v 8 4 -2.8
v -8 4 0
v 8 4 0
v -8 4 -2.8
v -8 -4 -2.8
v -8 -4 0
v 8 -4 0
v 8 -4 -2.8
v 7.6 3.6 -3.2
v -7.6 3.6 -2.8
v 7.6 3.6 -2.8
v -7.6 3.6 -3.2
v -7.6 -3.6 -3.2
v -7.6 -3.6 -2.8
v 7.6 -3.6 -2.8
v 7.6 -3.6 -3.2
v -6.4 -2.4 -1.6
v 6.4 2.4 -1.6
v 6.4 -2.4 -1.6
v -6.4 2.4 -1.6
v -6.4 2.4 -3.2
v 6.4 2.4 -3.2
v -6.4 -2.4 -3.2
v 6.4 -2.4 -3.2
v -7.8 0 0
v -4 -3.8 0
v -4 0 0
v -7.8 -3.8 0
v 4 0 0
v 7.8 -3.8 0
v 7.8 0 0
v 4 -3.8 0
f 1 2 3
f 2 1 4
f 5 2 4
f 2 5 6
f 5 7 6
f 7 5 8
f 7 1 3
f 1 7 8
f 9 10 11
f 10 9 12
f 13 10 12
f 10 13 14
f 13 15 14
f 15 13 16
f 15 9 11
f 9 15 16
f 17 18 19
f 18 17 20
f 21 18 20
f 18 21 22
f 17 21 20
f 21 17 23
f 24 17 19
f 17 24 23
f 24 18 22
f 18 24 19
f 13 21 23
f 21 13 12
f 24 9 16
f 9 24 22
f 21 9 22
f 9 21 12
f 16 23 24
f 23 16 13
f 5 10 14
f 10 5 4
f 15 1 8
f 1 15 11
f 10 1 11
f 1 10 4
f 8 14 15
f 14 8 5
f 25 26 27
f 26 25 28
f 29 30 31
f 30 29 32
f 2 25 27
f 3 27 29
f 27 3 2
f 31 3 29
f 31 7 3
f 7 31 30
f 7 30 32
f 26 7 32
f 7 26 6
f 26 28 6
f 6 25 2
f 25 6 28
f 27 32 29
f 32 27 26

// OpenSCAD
// file: ../p/4-4edge.scad
use <../lib.scad>
$fa=1; $fs=0.2;
function ldraw_lib__4_4edge(realsolid=false) = [
// 0 Circle 1.0
// 0 Name: 4-4edge.dat
// 0 Author: James Jessiman
// 0 !LDRAW_ORG Primitive UPDATE 2017-01
// 0 !LICENSE Licensed under CC BY 2.0 and CC BY 4.0 : see CAreadme.txt
// 
// 0 BFC CERTIFY CCW
  [0,"BFC","CERTIFY"],
  [0,"BFC","CCW"],
// 
// 0 !HISTORY 1998-12-15 [PTadmin] Official Update 1998-10
// 0 !HISTORY 2005-12-28 [PTadmin] Official Update 2005-01
// 0 !HISTORY 2007-06-24 [PTadmin] Header formatted for Contributor Agreement
// 0 !HISTORY 2008-07-01 [PTadmin] Official Update 2008-01
// 0 !HISTORY 2017-01-15 [Steffen] BFCed
// 0 !HISTORY 2017-12-30 [PTadmin] Official Update 2017-01
// 
// 
// 2 24 1 0 0 0.9239 0 0.3827
  [2,24,1,0,0,0.9239,0,0.3827],
// 2 24 0.9239 0 0.3827 0.7071 0 0.7071
  [2,24,0.9239,0,0.3827,0.7071,0,0.7071],
// 2 24 0.7071 0 0.7071 0.3827 0 0.9239
  [2,24,0.7071,0,0.7071,0.3827,0,0.9239],
// 2 24 0.3827 0 0.9239 0 0 1
  [2,24,0.3827,0,0.9239,0,0,1],
// 2 24 0 0 1 -0.3827 0 0.9239
  [2,24,0,0,1,-0.3827,0,0.9239],
// 2 24 -0.3827 0 0.9239 -0.7071 0 0.7071
  [2,24,-0.3827,0,0.9239,-0.7071,0,0.7071],
// 2 24 -0.7071 0 0.7071 -0.9239 0 0.3827
  [2,24,-0.7071,0,0.7071,-0.9239,0,0.3827],
// 2 24 -0.9239 0 0.3827 -1 0 -0
  [2,24,-0.9239,0,0.3827,-1,0,-0],
// 2 24 -1 0 -0 -0.9239 0 -0.3827
  [2,24,-1,0,-0,-0.9239,0,-0.3827],
// 2 24 -0.9239 0 -0.3827 -0.7071 0 -0.7071
  [2,24,-0.9239,0,-0.3827,-0.7071,0,-0.7071],
// 2 24 -0.7071 0 -0.7071 -0.3827 0 -0.9239
  [2,24,-0.7071,0,-0.7071,-0.3827,0,-0.9239],
// 2 24 -0.3827 0 -0.9239 0 0 -1
  [2,24,-0.3827,0,-0.9239,0,0,-1],
// 2 24 0 0 -1 0.3827 0 -0.9239
  [2,24,0,0,-1,0.3827,0,-0.9239],
// 2 24 0.3827 0 -0.9239 0.7071 0 -0.7071
  [2,24,0.3827,0,-0.9239,0.7071,0,-0.7071],
// 2 24 0.7071 0 -0.7071 0.9239 0 -0.3827
  [2,24,0.7071,0,-0.7071,0.9239,0,-0.3827],
// 2 24 0.9239 0 -0.3827 1 0 0
  [2,24,0.9239,0,-0.3827,1,0,0],
];
module ldraw_lib__4_4edge(step=0, col=false, unit=2/5, alt=false, line=0.2, solid=!$preview)
    makepoly(ldraw_lib__4_4edge(solid), step=step, col=col, unit=unit, alt=alt, line=line, solid=solid);
ldraw_lib__4_4edge(line=0.2);
// file: ../p/4-4disc.scad
use <../lib.scad>
$fa=1; $fs=0.2;
function ldraw_lib__4_4disc(realsolid=false) = [
// 0 Disc 1.0
// 0 Name: 4-4disc.dat
// 0 Author: James Jessiman
// 0 !LDRAW_ORG Primitive UPDATE 2002-02
// 0 !LICENSE Licensed under CC BY 2.0 and CC BY 4.0 : see CAreadme.txt
// 
// 0 BFC CERTIFY CCW
  [0,"BFC","CERTIFY"],
  [0,"BFC","CCW"],
// 
// 0 !HISTORY 1998-12-15 [PTadmin] Official Update 1998-10
// 0 !HISTORY 2002-03-23 [sbliss] Added BFC statement
// 0 !HISTORY 2002-04-25 [PTadmin] Official Update 2002-02
// 0 !HISTORY 2007-06-24 [PTadmin] Header formatted for Contributor Agreement
// 0 !HISTORY 2008-07-01 [PTadmin] Official Update 2008-01
// 
// 
// 3 16 0 0 0 1 0 0 0.9239 0 0.3827
  [3,16,0,0,0,1,0,0,0.9239,0,0.3827],
// 3 16 0 0 0 0.9239 0 0.3827 0.7071 0 0.7071
  [3,16,0,0,0,0.9239,0,0.3827,0.7071,0,0.7071],
// 3 16 0 0 0 0.7071 0 0.7071 0.3827 0 0.9239
  [3,16,0,0,0,0.7071,0,0.7071,0.3827,0,0.9239],
// 3 16 0 0 0 0.3827 0 0.9239 0 0 1
  [3,16,0,0,0,0.3827,0,0.9239,0,0,1],
// 3 16 0 0 0 0 0 1 -0.3827 0 0.9239
  [3,16,0,0,0,0,0,1,-0.3827,0,0.9239],
// 3 16 0 0 0 -0.3827 0 0.9239 -0.7071 0 0.7071
  [3,16,0,0,0,-0.3827,0,0.9239,-0.7071,0,0.7071],
// 3 16 0 0 0 -0.7071 0 0.7071 -0.9239 0 0.3827
  [3,16,0,0,0,-0.7071,0,0.7071,-0.9239,0,0.3827],
// 3 16 0 0 0 -0.9239 0 0.3827 -1 0 -0
  [3,16,0,0,0,-0.9239,0,0.3827,-1,0,-0],
// 3 16 0 0 0 -1 0 -0 -0.9239 0 -0.3827
  [3,16,0,0,0,-1,0,-0,-0.9239,0,-0.3827],
// 3 16 0 0 0 -0.9239 0 -0.3827 -0.7071 0 -0.7071
  [3,16,0,0,0,-0.9239,0,-0.3827,-0.7071,0,-0.7071],
// 3 16 0 0 0 -0.7071 0 -0.7071 -0.3827 0 -0.9239
  [3,16,0,0,0,-0.7071,0,-0.7071,-0.3827,0,-0.9239],
// 3 16 0 0 0 -0.3827 0 -0.9239 0 0 -1
  [3,16,0,0,0,-0.3827,0,-0.9239,0,0,-1],
// 3 16 0 0 0 0 0 -1 0.3827 0 -0.9239
  [3,16,0,0,0,0,0,-1,0.3827,0,-0.9239],
// 3 16 0 0 0 0.3827 0 -0.9239 0.7071 0 -0.7071
  [3,16,0,0,0,0.3827,0,-0.9239,0.7071,0,-0.7071],
// 3 16 0 0 0 0.7071 0 -0.7071 0.9239 0 -0.3827
  [3,16,0,0,0,0.7071,0,-0.7071,0.9239,0,-0.3827],
// 3 16 0 0 0 0.9239 0 -0.3827 1 0 0
  [3,16,0,0,0,0.9239,0,-0.3827,1,0,0],
// 0
];
module ldraw_lib__4_4disc(step=0, col=false, unit=2/5, alt=false, line=0.2, solid=!$preview)
    makepoly(ldraw_lib__4_4disc(solid), step=step, col=col, unit=unit, alt=alt, line=line, solid=solid);
ldraw_lib__4_4disc(line=0.2);
// file: ../p/4-4cyli.scad
use <../lib.scad>
$fa=1; $fs=0.2;
function ldraw_lib__4_4cyli(realsolid=false) = [
// 0 Cylinder 1.0
// 0 Name: 4-4cyli.dat
// 0 Author: James Jessiman
// 0 !LDRAW_ORG Primitive UPDATE 2005-01
// 0 !LICENSE Licensed under CC BY 2.0 and CC BY 4.0 : see CAreadme.txt
// 
// 0 BFC CERTIFY CCW
  [0,"BFC","CERTIFY"],
  [0,"BFC","CCW"],
// 
// 0 !HISTORY 1998-12-15 [PTadmin] Official Update 1998-10
// 0 !HISTORY 2002-03-23 [sbliss] Added BFC statement; merged headers from files in distributions LDraw 0.27 and Complete.
// 0 !HISTORY 2002-04-25 [PTadmin] Official Update 2002-02
// 0 !HISTORY 2004-12-14 [guyvivan] BFC CCW
// 0 !HISTORY 2005-12-28 [PTadmin] Official Update 2005-01
// 0 !HISTORY 2007-06-24 [PTadmin] Header formatted for Contributor Agreement
// 0 !HISTORY 2008-07-01 [PTadmin] Official Update 2008-01
// 
// 
// 4 16 1 1 0 0.9239 1 0.3827 0.9239 0 0.3827 1 0 0
  [4,16,1,1,0,0.9239,1,0.3827,0.9239,0,0.3827,1,0,0],
// 5 24 1 0 0 1 1 0 0.9239 0 0.3827 0.9239 0 -0.3827
  [5,24,1,0,0,1,1,0,0.9239,0,0.3827,0.9239,0,-0.3827],
// 4 16 0.9239 1 0.3827 0.7071 1 0.7071 0.7071 0 0.7071 0.9239 0 0.3827
  [4,16,0.9239,1,0.3827,0.7071,1,0.7071,0.7071,0,0.7071,0.9239,0,0.3827],
// 5 24 0.9239 0 0.3827 0.9239 1 0.3827 0.7071 0 0.7071 1 0 0
  [5,24,0.9239,0,0.3827,0.9239,1,0.3827,0.7071,0,0.7071,1,0,0],
// 4 16 0.7071 1 0.7071 0.3827 1 0.9239 0.3827 0 0.9239 0.7071 0 0.7071
  [4,16,0.7071,1,0.7071,0.3827,1,0.9239,0.3827,0,0.9239,0.7071,0,0.7071],
// 5 24 0.7071 0 0.7071 0.7071 1 0.7071 0.3827 0 0.9239 0.9239 0 0.3827
  [5,24,0.7071,0,0.7071,0.7071,1,0.7071,0.3827,0,0.9239,0.9239,0,0.3827],
// 4 16 0.3827 1 0.9239 0 1 1 0 0 1 0.3827 0 0.9239
  [4,16,0.3827,1,0.9239,0,1,1,0,0,1,0.3827,0,0.9239],
// 5 24 0.3827 0 0.9239 0.3827 1 0.9239 0 0 1 0.7071 0 0.7071
  [5,24,0.3827,0,0.9239,0.3827,1,0.9239,0,0,1,0.7071,0,0.7071],
// 4 16 0 1 1 -0.3827 1 0.9239 -0.3827 0 0.9239 0 0 1
  [4,16,0,1,1,-0.3827,1,0.9239,-0.3827,0,0.9239,0,0,1],
// 5 24 0 0 1 0 1 1 -0.3827 0 0.9239 0.3827 0 0.9239
  [5,24,0,0,1,0,1,1,-0.3827,0,0.9239,0.3827,0,0.9239],
// 4 16 -0.3827 1 0.9239 -0.7071 1 0.7071 -0.7071 0 0.7071 -0.3827 0 0.9239
  [4,16,-0.3827,1,0.9239,-0.7071,1,0.7071,-0.7071,0,0.7071,-0.3827,0,0.9239],
// 5 24 -0.3827 0 0.9239 -0.3827 1 0.9239 -0.7071 0 0.7071 0 0 1
  [5,24,-0.3827,0,0.9239,-0.3827,1,0.9239,-0.7071,0,0.7071,0,0,1],
// 4 16 -0.7071 1 0.7071 -0.9239 1 0.3827 -0.9239 0 0.3827 -0.7071 0 0.7071
  [4,16,-0.7071,1,0.7071,-0.9239,1,0.3827,-0.9239,0,0.3827,-0.7071,0,0.7071],
// 5 24 -0.7071 0 0.7071 -0.7071 1 0.7071 -0.9239 0 0.3827 -0.3827 0 0.9239
  [5,24,-0.7071,0,0.7071,-0.7071,1,0.7071,-0.9239,0,0.3827,-0.3827,0,0.9239],
// 4 16 -0.9239 1 0.3827 -1 1 0 -1 0 0 -0.9239 0 0.3827
  [4,16,-0.9239,1,0.3827,-1,1,0,-1,0,0,-0.9239,0,0.3827],
// 5 24 -0.9239 0 0.3827 -0.9239 1 0.3827 -1 0 0 -0.7071 0 0.7071
  [5,24,-0.9239,0,0.3827,-0.9239,1,0.3827,-1,0,0,-0.7071,0,0.7071],
// 4 16 -1 1 0 -0.9239 1 -0.3827 -0.9239 0 -0.3827 -1 0 0
  [4,16,-1,1,0,-0.9239,1,-0.3827,-0.9239,0,-0.3827,-1,0,0],
// 5 24 -1 0 0 -1 1 0 -0.9239 0 -0.3827 -0.9239 0 0.3827
  [5,24,-1,0,0,-1,1,0,-0.9239,0,-0.3827,-0.9239,0,0.3827],
// 4 16 -0.9239 1 -0.3827 -0.7071 1 -0.7071 -0.7071 0 -0.7071 -0.9239 0 -0.3827
  [4,16,-0.9239,1,-0.3827,-0.7071,1,-0.7071,-0.7071,0,-0.7071,-0.9239,0,-0.3827],
// 5 24 -0.9239 0 -0.3827 -0.9239 1 -0.3827 -0.7071 0 -0.7071 -1 0 0
  [5,24,-0.9239,0,-0.3827,-0.9239,1,-0.3827,-0.7071,0,-0.7071,-1,0,0],
// 4 16 -0.7071 1 -0.7071 -0.3827 1 -0.9239 -0.3827 0 -0.9239 -0.7071 0 -0.7071
  [4,16,-0.7071,1,-0.7071,-0.3827,1,-0.9239,-0.3827,0,-0.9239,-0.7071,0,-0.7071],
// 5 24 -0.7071 0 -0.7071 -0.7071 1 -0.7071 -0.3827 0 -0.9239 -0.9239 0 -0.3827
  [5,24,-0.7071,0,-0.7071,-0.7071,1,-0.7071,-0.3827,0,-0.9239,-0.9239,0,-0.3827],
// 4 16 -0.3827 1 -0.9239 0 1 -1 0 0 -1 -0.3827 0 -0.9239
  [4,16,-0.3827,1,-0.9239,0,1,-1,0,0,-1,-0.3827,0,-0.9239],
// 5 24 -0.3827 0 -0.9239 -0.3827 1 -0.9239 0 0 -1 -0.7071 0 -0.7071
  [5,24,-0.3827,0,-0.9239,-0.3827,1,-0.9239,0,0,-1,-0.7071,0,-0.7071],
// 4 16 0 1 -1 0.3827 1 -0.9239 0.3827 0 -0.9239 0 0 -1
  [4,16,0,1,-1,0.3827,1,-0.9239,0.3827,0,-0.9239,0,0,-1],
// 5 24 0 0 -1 0 1 -1 0.3827 0 -0.9239 -0.3827 0 -0.9239
  [5,24,0,0,-1,0,1,-1,0.3827,0,-0.9239,-0.3827,0,-0.9239],
// 4 16 0.3827 1 -0.9239 0.7071 1 -0.7071 0.7071 0 -0.7071 0.3827 0 -0.9239
  [4,16,0.3827,1,-0.9239,0.7071,1,-0.7071,0.7071,0,-0.7071,0.3827,0,-0.9239],
// 5 24 0.3827 0 -0.9239 0.3827 1 -0.9239 0.7071 0 -0.7071 0 0 -1
  [5,24,0.3827,0,-0.9239,0.3827,1,-0.9239,0.7071,0,-0.7071,0,0,-1],
// 4 16 0.7071 1 -0.7071 0.9239 1 -0.3827 0.9239 0 -0.3827 0.7071 0 -0.7071
  [4,16,0.7071,1,-0.7071,0.9239,1,-0.3827,0.9239,0,-0.3827,0.7071,0,-0.7071],
// 5 24 0.7071 0 -0.7071 0.7071 1 -0.7071 0.9239 0 -0.3827 0.3827 0 -0.9239
  [5,24,0.7071,0,-0.7071,0.7071,1,-0.7071,0.9239,0,-0.3827,0.3827,0,-0.9239],
// 4 16 0.9239 1 -0.3827 1 1 0 1 0 0 0.9239 0 -0.3827
  [4,16,0.9239,1,-0.3827,1,1,0,1,0,0,0.9239,0,-0.3827],
// 5 24 0.9239 0 -0.3827 0.9239 1 -0.3827 1 0 0 0.7071 0 -0.7071
  [5,24,0.9239,0,-0.3827,0.9239,1,-0.3827,1,0,0,0.7071,0,-0.7071],
// 0
];
module ldraw_lib__4_4cyli(step=0, col=false, unit=2/5, alt=false, line=0.2, solid=!$preview)
    makepoly(ldraw_lib__4_4cyli(solid), step=step, col=col, unit=unit, alt=alt, line=line, solid=solid);
ldraw_lib__4_4cyli(line=0.2);
// file: ../p/stud3.scad
use <../lib.scad>
use <4-4cyli.scad>
use <4-4disc.scad>
use <4-4edge.scad>
$fa=1; $fs=0.2;
function ldraw_lib__stud3(realsolid=false) = realsolid ? 
    [openscad(translate([0,0,-eps()], o=cylinder(4+eps(), r=4)),2)] : [
// 0 Stud Tube Solid
// 0 Name: stud3.dat
// 0 Author: James Jessiman
// 0 !LDRAW_ORG Primitive UPDATE 2012-01
// 0 !LICENSE Licensed under CC BY 2.0 and CC BY 4.0 : see CAreadme.txt
// 
// 0 BFC CERTIFY CCW
  [0,"BFC","CERTIFY"],
  [0,"BFC","CCW"],
// 
// 0 !HISTORY 2002-04-04 [sbliss] Modified for BFC compliance
// 0 !HISTORY 2002-04-25 [PTadmin] Official Update 2002-02
// 0 !HISTORY 2007-06-24 [PTadmin] Header formatted for Contributor Agreement
// 0 !HISTORY 2008-07-01 [PTadmin] Official Update 2008-01
// 0 !HISTORY 2012-02-16 [Philo] Changed to CCW
// 0 !HISTORY 2012-03-30 [PTadmin] Official Update 2012-01
// 
// 
// 1 16 0 -4 0 4 0 0 0 1 0 0 0 4 4-4edge.dat
  [1,16,0,-4,0,4,0,0,0,1,0,0,0,4, ldraw_lib__4_4edge(realsolid)],
// 1 16 0 0 0 4 0 0 0 1 0 0 0 4 4-4edge.dat
  [1,16,0,0,0,4,0,0,0,1,0,0,0,4, ldraw_lib__4_4edge(realsolid)],
// 1 16 0 -4 0 4 0 0 0 1 0 0 0 4 4-4disc.dat
  [1,16,0,-4,0,4,0,0,0,1,0,0,0,4, ldraw_lib__4_4disc(realsolid)],
// 1 16 0 -4 0 4 0 0 0 4 0 0 0 4 4-4cyli.dat
  [1,16,0,-4,0,4,0,0,0,4,0,0,0,4, ldraw_lib__4_4cyli(realsolid)],
];
module ldraw_lib__stud3(step=0, col=false, unit=2/5, alt=false, line=0.2, solid=!$preview)
    makepoly(ldraw_lib__stud3(solid), step=step, col=col, unit=unit, alt=alt, line=line, solid=solid);
ldraw_lib__stud3(line=0.2);
// file: ../p/stud.scad
use <../lib.scad>
use <4-4cyli.scad>
use <4-4disc.scad>
use <4-4edge.scad>
$fa=1; $fs=0.2;
function ldraw_lib__stud(realsolid=false) = realsolid ? 
    [openscad(translate([0,0,-eps()], o=cylinder(4+eps(), r=6)),2)] : [
// 0 Stud
// 0 Name: stud.dat
// 0 Author: James Jessiman
// 0 !LDRAW_ORG Primitive UPDATE 2012-01
// 0 !LICENSE Licensed under CC BY 2.0 and CC BY 4.0 : see CAreadme.txt
// 
// 0 BFC CERTIFY CCW
  [0,"BFC","CERTIFY"],
  [0,"BFC","CCW"],
// 
// 0 !HISTORY 2002-04-04 [sbliss] Modified for BFC compliance
// 0 !HISTORY 2002-04-25 [PTadmin] Official Update 2002-02
// 0 !HISTORY 2007-06-24 [PTadmin] Header formatted for Contributor Agreement
// 0 !HISTORY 2008-07-01 [PTadmin] Official Update 2008-01
// 0 !HISTORY 2012-02-16 [Philo] Changed to CCW
// 0 !HISTORY 2012-03-30 [PTadmin] Official Update 2012-01
// 
// 
// 1 16 0 0 0 6 0 0 0 1 0 0 0 6 4-4edge.dat
  [1,16,0,0,0,6,0,0,0,1,0,0,0,6, ldraw_lib__4_4edge(realsolid)],
// 1 16 0 -4 0 6 0 0 0 1 0 0 0 6 4-4edge.dat
  [1,16,0,-4,0,6,0,0,0,1,0,0,0,6, ldraw_lib__4_4edge(realsolid)],
// 1 16 0 0 0 6 0 0 0 -4 0 0 0 6 4-4cyli.dat
  [1,16,0,0,0,6,0,0,0,-4,0,0,0,6, ldraw_lib__4_4cyli(realsolid)],
// 1 16 0 -4 0 6 0 0 0 1 0 0 0 6 4-4disc.dat
  [1,16,0,-4,0,6,0,0,0,1,0,0,0,6, ldraw_lib__4_4disc(realsolid)],
];
module ldraw_lib__stud(step=0, col=false, unit=2/5, alt=false, line=0.2, solid=!$preview)
    makepoly(ldraw_lib__stud(solid), step=step, col=col, unit=unit, alt=alt, line=line, solid=solid);
ldraw_lib__stud(line=0.2);
// file: ../p/box4t.scad
use <../lib.scad>
$fa=1; $fs=0.2;
function ldraw_lib__box4t(realsolid=false) = [
// 0 Box with 4 Adjacent Faces and All Edges
// 0 Name: box4t.dat
// 0 Author: Tore Eriksson [Tore_Eriksson]
// 0 !LDRAW_ORG Primitive UPDATE 2003-02
// 0 !LICENSE Licensed under CC BY 2.0 and CC BY 4.0 : see CAreadme.txt
// 
// 0 BFC CERTIFY CCW
  [0,"BFC","CERTIFY"],
  [0,"BFC","CCW"],
// 
// 0 !HISTORY 1997-09-29 [PTadmin] Official Update 1997-15
// 0 !HISTORY 2002-08-31 [izanette] Modified with WINDZ for BFC compliance
// 0 !HISTORY 2003-08-01 [PTadmin] Official Update 2003-02
// 0 !HISTORY 2007-06-24 [PTadmin] Header formatted for Contributor Agreement
// 0 !HISTORY 2008-07-01 [PTadmin] Official Update 2008-01
// 
// 
// 2 24 1 1 1 -1 1 1
  [2,24,1,1,1,-1,1,1],
// 2 24 -1 1 1 -1 1 -1
  [2,24,-1,1,1,-1,1,-1],
// 2 24 -1 1 -1 1 1 -1
  [2,24,-1,1,-1,1,1,-1],
// 2 24 1 1 -1 1 1 1
  [2,24,1,1,-1,1,1,1],
// 2 24 1 0 1 -1 0 1
  [2,24,1,0,1,-1,0,1],
// 2 24 -1 0 1 -1 0 -1
  [2,24,-1,0,1,-1,0,-1],
// 2 24 -1 0 -1 1 0 -1
  [2,24,-1,0,-1,1,0,-1],
// 2 24 1 0 -1 1 0 1
  [2,24,1,0,-1,1,0,1],
// 2 24 1 0 1 1 1 1
  [2,24,1,0,1,1,1,1],
// 2 24 -1 0 1 -1 1 1
  [2,24,-1,0,1,-1,1,1],
// 2 24 1 0 -1 1 1 -1
  [2,24,1,0,-1,1,1,-1],
// 2 24 -1 0 -1 -1 1 -1
  [2,24,-1,0,-1,-1,1,-1],
// 4 16 1 1 1 1 1 -1 -1 1 -1 -1 1 1
  [4,16,1,1,1,1,1,-1,-1,1,-1,-1,1,1],
// 4 16 1 1 1 -1 1 1 -1 0 1 1 0 1
  [4,16,1,1,1,-1,1,1,-1,0,1,1,0,1],
// 4 16 -1 1 1 -1 1 -1 -1 0 -1 -1 0 1
  [4,16,-1,1,1,-1,1,-1,-1,0,-1,-1,0,1],
// 0 4 16 -1 1 -1 -1 0 -1 1 0 -1 1 1 -1
// 4 16 1 1 -1 1 1 1 1 0 1 1 0 -1
  [4,16,1,1,-1,1,1,1,1,0,1,1,0,-1],
// 0
];
module ldraw_lib__box4t(step=0, col=false, unit=2/5, alt=false, line=0.2, solid=!$preview)
    makepoly(ldraw_lib__box4t(solid), step=step, col=col, unit=unit, alt=alt, line=line, solid=solid);
ldraw_lib__box4t(line=0.2);
// file: s/3004s01.scad
use <../../lib.scad>
use <../../p/box4t.scad>
use <../../p/box5.scad>
use <../../p/stud.scad>
use <../../p/stud3.scad>
$fa=1; $fs=0.2;
function ldraw_lib__s__3004s01(realsolid=false) = [
// 0 ~Brick  1 x  2 without Front Face
// 0 Name: s\3004s01.dat
// 0 Author: James Jessiman
// 0 !LDRAW_ORG Subpart UPDATE 2003-03
// 0 !LICENSE Licensed under CC BY 2.0 and CC BY 4.0 : see CAreadme.txt
// 
// 0 BFC CERTIFY CCW
  [0,"BFC","CERTIFY"],
  [0,"BFC","CCW"],
// 
// 0 !HISTORY 2003-09-07 [jriley] Subfiling, BFC
// 0 !HISTORY 2003-12-19 [PTadmin] Official Update 2003-03
// 0 !HISTORY 2007-08-29 [PTadmin] Header formatted for Contributor Agreement
// 0 !HISTORY 2008-07-01 [PTadmin] Official Update 2008-01
// 
// 
// 1 16 0 4 0 1 0 0 0 -5 0 0 0 1 stud3.dat
  [1,16,0,4,0,1,0,0,0,-5,0,0,0,1, ldraw_lib__stud3(realsolid)],
// 0 BFC INVERTNEXT
  [0,"BFC","INVERTNEXT"],
// 1 16 0 24 0 16 0 0 0 -20 0 0 0 6 box5.dat
  [1,16,0,24,0,16,0,0,0,-20,0,0,0,6, ldraw_lib__box5(realsolid)],
// 4 16 20 24 10 16 24 6 -16 24 6 -20 24 10
  [4,16,20,24,10,16,24,6,-16,24,6,-20,24,10],
// 4 16 -20 24 10 -16 24 6 -16 24 -6 -20 24 -10
  [4,16,-20,24,10,-16,24,6,-16,24,-6,-20,24,-10],
// 4 16 -20 24 -10 -16 24 -6 16 24 -6 20 24 -10
  [4,16,-20,24,-10,-16,24,-6,16,24,-6,20,24,-10],
// 4 16 20 24 -10 16 24 -6 16 24 6 20 24 10
  [4,16,20,24,-10,16,24,-6,16,24,6,20,24,10],
// 1 16 0 24 0 20 0 0 0 -24 0 0 0 10 box4t.dat
  [1,16,0,24,0,20,0,0,0,-24,0,0,0,10, ldraw_lib__box4t(realsolid)],
// 1 16 10 0 0 1 0 0 0 1 0 0 0 1 stud.dat
  [1,16,10,0,0,1,0,0,0,1,0,0,0,1, ldraw_lib__stud(realsolid)],
// 1 16 -10 0 0 1 0 0 0 1 0 0 0 1 stud.dat
  [1,16,-10,0,0,1,0,0,0,1,0,0,0,1, ldraw_lib__stud(realsolid)],
// 0
];
module ldraw_lib__s__3004s01(step=0, col=false, unit=2/5, alt=false, line=0.2, solid=!$preview)
    makepoly(ldraw_lib__s__3004s01(solid), step=step, col=col, unit=unit, alt=alt, line=line, solid=solid);
ldraw_lib__s__3004s01(line=0.2);
// file: ../p/box5.scad
use <../lib.scad>
$fa=1; $fs=0.2;
function ldraw_lib__box5(realsolid=false) = [
// 0 Box with 5 Faces and All Edges
// 0 Name: box5.dat
// 0 Author: James Jessiman
// 0 !LDRAW_ORG Primitive UPDATE 2012-01
// 0 !LICENSE Licensed under CC BY 2.0 and CC BY 4.0 : see CAreadme.txt
// 
// 0 BFC CERTIFY CCW
  [0,"BFC","CERTIFY"],
  [0,"BFC","CCW"],
// 
// 0 !HISTORY 2002-04-03 [sbliss] Modified for BFC compliance
// 0 !HISTORY 2002-04-25 [PTadmin] Official Update 2002-02
// 0 !HISTORY 2007-06-24 [PTadmin] Header formatted for Contributor Agreement
// 0 !HISTORY 2008-07-01 [PTadmin] Official Update 2008-01
// 0 !HISTORY 2012-02-16 [Philo] Changed to CCW
// 0 !HISTORY 2012-03-30 [PTadmin] Official Update 2012-01
// 
// 
// 2 24 1 1 1 -1 1 1
  [2,24,1,1,1,-1,1,1],
// 2 24 -1 1 1 -1 1 -1
  [2,24,-1,1,1,-1,1,-1],
// 2 24 -1 1 -1 1 1 -1
  [2,24,-1,1,-1,1,1,-1],
// 2 24 1 1 -1 1 1 1
  [2,24,1,1,-1,1,1,1],
// 2 24 1 0 1 -1 0 1
  [2,24,1,0,1,-1,0,1],
// 2 24 -1 0 1 -1 0 -1
  [2,24,-1,0,1,-1,0,-1],
// 2 24 -1 0 -1 1 0 -1
  [2,24,-1,0,-1,1,0,-1],
// 2 24 1 0 -1 1 0 1
  [2,24,1,0,-1,1,0,1],
// 2 24 1 0 1 1 1 1
  [2,24,1,0,1,1,1,1],
// 2 24 -1 0 1 -1 1 1
  [2,24,-1,0,1,-1,1,1],
// 2 24 1 0 -1 1 1 -1
  [2,24,1,0,-1,1,1,-1],
// 2 24 -1 0 -1 -1 1 -1
  [2,24,-1,0,-1,-1,1,-1],
// 4 16 -1 1 1 1 1 1 1 1 -1 -1 1 -1
  [4,16,-1,1,1,1,1,1,1,1,-1,-1,1,-1],
// 4 16 -1 1 1 -1 0 1 1 0 1 1 1 1
  [4,16,-1,1,1,-1,0,1,1,0,1,1,1,1],
// 4 16 -1 1 -1 -1 0 -1 -1 0 1 -1 1 1
  [4,16,-1,1,-1,-1,0,-1,-1,0,1,-1,1,1],
// 4 16 1 1 -1 1 0 -1 -1 0 -1 -1 1 -1
  [4,16,1,1,-1,1,0,-1,-1,0,-1,-1,1,-1],
// 4 16 1 1 1 1 0 1 1 0 -1 1 1 -1
  [4,16,1,1,1,1,0,1,1,0,-1,1,1,-1],
];
module ldraw_lib__box5(step=0, col=false, unit=2/5, alt=false, line=0.2, solid=!$preview)
    makepoly(ldraw_lib__box5(solid), step=step, col=col, unit=unit, alt=alt, line=line, solid=solid);
ldraw_lib__box5(line=0.2);
// file: ../p/box4.scad
use <../lib.scad>
$fa=1; $fs=0.2;
function ldraw_lib__box4(realsolid=false) = [
// 0 Box with 4 Faces (2 Parallel Pairs) and All Edges
// 0 Name: box4.dat
// 0 Author: James Jessiman
// 0 !LDRAW_ORG Primitive UPDATE 2012-01
// 0 !LICENSE Licensed under CC BY 2.0 and CC BY 4.0 : see CAreadme.txt
// 
// 0 BFC CERTIFY CCW
  [0,"BFC","CERTIFY"],
  [0,"BFC","CCW"],
// 
// 0 !HISTORY 2002-04-03 [sbliss] Modified for BFC compliance
// 0 !HISTORY 2002-04-25 [PTadmin] Official Update 2002-02
// 0 !HISTORY 2007-06-24 [PTadmin] Header formatted for Contributor Agreement
// 0 !HISTORY 2008-07-01 [PTadmin] Official Update 2008-01
// 0 !HISTORY 2012-02-16 [Philo] Changed to CCW
// 0 !HISTORY 2012-03-30 [PTadmin] Official Update 2012-01
// 
// 
// 2 24 1 1 1 -1 1 1
  [2,24,1,1,1,-1,1,1],
// 2 24 -1 1 1 -1 1 -1
  [2,24,-1,1,1,-1,1,-1],
// 2 24 -1 1 -1 1 1 -1
  [2,24,-1,1,-1,1,1,-1],
// 2 24 1 1 -1 1 1 1
  [2,24,1,1,-1,1,1,1],
// 2 24 1 0 1 -1 0 1
  [2,24,1,0,1,-1,0,1],
// 2 24 -1 0 1 -1 0 -1
  [2,24,-1,0,1,-1,0,-1],
// 2 24 -1 0 -1 1 0 -1
  [2,24,-1,0,-1,1,0,-1],
// 2 24 1 0 -1 1 0 1
  [2,24,1,0,-1,1,0,1],
// 2 24 1 0 1 1 1 1
  [2,24,1,0,1,1,1,1],
// 2 24 -1 0 1 -1 1 1
  [2,24,-1,0,1,-1,1,1],
// 2 24 1 0 -1 1 1 -1
  [2,24,1,0,-1,1,1,-1],
// 2 24 -1 0 -1 -1 1 -1
  [2,24,-1,0,-1,-1,1,-1],
// 4 16 -1 1 1 -1 0 1 1 0 1 1 1 1
  [4,16,-1,1,1,-1,0,1,1,0,1,1,1,1],
// 4 16 -1 1 -1 -1 0 -1 -1 0 1 -1 1 1
  [4,16,-1,1,-1,-1,0,-1,-1,0,1,-1,1,1],
// 4 16 1 1 -1 1 0 -1 -1 0 -1 -1 1 -1
  [4,16,1,1,-1,1,0,-1,-1,0,-1,-1,1,-1],
// 4 16 1 1 1 1 0 1 1 0 -1 1 1 -1
  [4,16,1,1,1,1,0,1,1,0,-1,1,1,-1],
];
module ldraw_lib__box4(step=0, col=false, unit=2/5, alt=false, line=0.2, solid=!$preview)
    makepoly(ldraw_lib__box4(solid), step=step, col=col, unit=unit, alt=alt, line=line, solid=solid);
ldraw_lib__box4(line=0.2);
// file: 3004.scad
use <../lib.scad>
use <s/3004s01.scad>
$fa=1; $fs=0.2;
function ldraw_lib__3004(realsolid=false) = [
// 0 Brick  1 x  2
// 0 Name: 3004.dat
// 0 Author: James Jessiman
// 0 !LDRAW_ORG Part UPDATE 2022-05
// 0 !LICENSE Licensed under CC BY 2.0 and CC BY 4.0 : see CAreadme.txt
// 
// 0 BFC CERTIFY CCW
  [0,"BFC","CERTIFY"],
  [0,"BFC","CCW"],
// 
// 0 !HISTORY 2001-10-26 [PTadmin] Official Update 2001-01
// 0 !HISTORY 2002-05-07 {unknown} BFC Certification
// 0 !HISTORY 2002-06-11 [PTadmin] Official Update 2002-03
// 0 !HISTORY 2007-05-07 [PTadmin] Header formatted for Contributor Agreement
// 0 !HISTORY 2008-07-01 [PTadmin] Official Update 2008-01
// 0 !HISTORY 2022-08-04 [MagFors] Using subfile
// 0 !HISTORY 2022-09-15 [PTadmin] Official Update 2022-05
// 
// 
// 1 16 0 0 0 1 0 0 0 1 0 0 0 1 s\3004s01.dat
  [1,16,0,0,0,1,0,0,0,1,0,0,0,1, ldraw_lib__s__3004s01(realsolid)],
// 4 16 -20 24 -10 20 24 -10 20 0 -10 -20 0 -10
  [4,16,-20,24,-10,20,24,-10,20,0,-10,-20,0,-10],
];
module ldraw_lib__3004(step=0, col=false, unit=2/5, alt=false, line=0.2, solid=!$preview)
    makepoly(ldraw_lib__3004(solid), step=step, col=col, unit=unit, alt=alt, line=line, solid=solid);
ldraw_lib__3004(line=0.2);
// file: s/3069bs01.scad
use <../../lib.scad>
use <../../p/box4.scad>
use <../../p/box5.scad>
$fa=1; $fs=0.2;
function ldraw_lib__s__3069bs01(realsolid=false) = [
// 0 ~Tile  1 x  2 with Groove without Top Face
// 0 Name: s\3069bs01.dat
// 0 Author: Santeri Piippo [arezey]
// 0 !LDRAW_ORG Subpart UPDATE 2010-02
// 0 !LICENSE Licensed under CC BY 2.0 and CC BY 4.0 : see CAreadme.txt
// 
// 0 BFC CERTIFY CCW
  [0,"BFC","CERTIFY"],
  [0,"BFC","CCW"],
// 
// 0 !HISTORY 2010-07-05 [PTadmin] Official Update 2010-02
// 
// 
// 1 16 0 0 0 20 0 0 0 7 0 0 0 10 box4.dat
  [1,16,0,0,0,20,0,0,0,7,0,0,0,10, ldraw_lib__box4(realsolid)],
// 1 16 0 7 0 19 0 0 0 1 0 0 0 9 box4.dat
  [1,16,0,7,0,19,0,0,0,1,0,0,0,9, ldraw_lib__box4(realsolid)],
// 0 BFC INVERTNEXT
  [0,"BFC","INVERTNEXT"],
// 1 16 0 8 0 16 0 0 0 -4 0 0 0 6 box5.dat
  [1,16,0,8,0,16,0,0,0,-4,0,0,0,6, ldraw_lib__box5(realsolid)],
// 4 16 -19 8 9 -16 8 6 -16 8 -6 -19 8 -9
  [4,16,-19,8,9,-16,8,6,-16,8,-6,-19,8,-9],
// 4 16 19 8 -9 16 8 -6 16 8 6 19 8 9
  [4,16,19,8,-9,16,8,-6,16,8,6,19,8,9],
// 4 16 19 8 9 16 8 6 -16 8 6 -19 8 9
  [4,16,19,8,9,16,8,6,-16,8,6,-19,8,9],
// 4 16 -19 8 -9 -16 8 -6 16 8 -6 19 8 -9
  [4,16,-19,8,-9,-16,8,-6,16,8,-6,19,8,-9],
// 4 16 -20 7 10 -19 7 9 -19 7 -9 -20 7 -10
  [4,16,-20,7,10,-19,7,9,-19,7,-9,-20,7,-10],
// 4 16 20 7 -10 19 7 -9 19 7 9 20 7 10
  [4,16,20,7,-10,19,7,-9,19,7,9,20,7,10],
// 4 16 20 7 10 19 7 9 -19 7 9 -20 7 10
  [4,16,20,7,10,19,7,9,-19,7,9,-20,7,10],
// 4 16 -20 7 -10 -19 7 -9 19 7 -9 20 7 -10
  [4,16,-20,7,-10,-19,7,-9,19,7,-9,20,7,-10],
// 0 //
];
module ldraw_lib__s__3069bs01(step=0, col=false, unit=2/5, alt=false, line=0.2, solid=!$preview)
    makepoly(ldraw_lib__s__3069bs01(solid), step=step, col=col, unit=unit, alt=alt, line=line, solid=solid);
ldraw_lib__s__3069bs01(line=0.2);
// main file
use <../lib.scad>
use <s/3069bs01.scad>
$fa=1; $fs=0.2;
function ldraw_lib__3069bpx3(realsolid=false) = [
// 0 Tile  1 x  2 with  2 Black Squares Pattern
// 0 Name: 3069bpx3.dat
// 0 Author: Vincent Messenet [Cheenzo]
// 0 !LDRAW_ORG Part UPDATE 2020-02
// 0 !LICENSE Licensed under CC BY 2.0 and CC BY 4.0 : see CAreadme.txt
// 
// 0 BFC CERTIFY CCW
  [0,"BFC","CERTIFY"],
  [0,"BFC","CCW"],
// 
// 0 !KEYWORDS BrickLink 3069bpb691, Chicken, Eyes, Minecraft, Set 21149
// 
// 0 !HISTORY 2020-09-05 [PTadmin] Official Update 2020-02
// 
// 
// 1 16 0 0 0 1 0 0 0 1 0 0 0 1 s\3069bs01.dat
  [1,16,0,0,0,1,0,0,0,1,0,0,0,1, ldraw_lib__s__3069bs01(realsolid)],
// 
// 4 0 -10 0 -9.5 -10 0 0 -19.5 0 0 -19.5 0 -9.5
  [4,0,-10,0,-9.5,-10,0,0,-19.5,0,0,-19.5,0,-9.5],
// 4 0 19.5 0 -9.5 19.5 0 0 10 0 0 10 0 -9.5
  [4,0,19.5,0,-9.5,19.5,0,0,10,0,0,10,0,-9.5],
// 
// 3 16 -20 0 10 -19.5 0 0 -10 0 0
  [3,16,-20,0,10,-19.5,0,0,-10,0,0],
// 4 16 -20 0 10 -10 0 0 10 0 0 20 0 10
  [4,16,-20,0,10,-10,0,0,10,0,0,20,0,10],
// 3 16 19.5 0 0 20 0 10 10 0 0
  [3,16,19.5,0,0,20,0,10,10,0,0],
// 4 16 20 0 10 19.5 0 0 19.5 0 -9.5 20 0 -10
  [4,16,20,0,10,19.5,0,0,19.5,0,-9.5,20,0,-10],
// 3 16 20 0 -10 19.5 0 -9.5 10 0 -9.5
  [3,16,20,0,-10,19.5,0,-9.5,10,0,-9.5],
// 4 16 20 0 -10 10 0 -9.5 -10 0 -9.5 -20 0 -10
  [4,16,20,0,-10,10,0,-9.5,-10,0,-9.5,-20,0,-10],
// 3 16 -10 0 -9.5 -19.5 0 -9.5 -20 0 -10
  [3,16,-10,0,-9.5,-19.5,0,-9.5,-20,0,-10],
// 4 16 -20 0 -10 -19.5 0 -9.5 -19.5 0 0 -20 0 10
  [4,16,-20,0,-10,-19.5,0,-9.5,-19.5,0,0,-20,0,10],
// 4 16 -10 0 0 -10 0 -9.5 10 0 -9.5 10 0 0
  [4,16,-10,0,0,-10,0,-9.5,10,0,-9.5,10,0,0],
];
module ldraw_lib__3069bpx3(step=0, col=false, unit=2/5, alt=false, line=0.2, solid=!$preview)
    makepoly(ldraw_lib__3069bpx3(solid), step=step, col=col, unit=unit, alt=alt, line=line, solid=solid);
ldraw_lib__3069bpx3(line=0.2);
